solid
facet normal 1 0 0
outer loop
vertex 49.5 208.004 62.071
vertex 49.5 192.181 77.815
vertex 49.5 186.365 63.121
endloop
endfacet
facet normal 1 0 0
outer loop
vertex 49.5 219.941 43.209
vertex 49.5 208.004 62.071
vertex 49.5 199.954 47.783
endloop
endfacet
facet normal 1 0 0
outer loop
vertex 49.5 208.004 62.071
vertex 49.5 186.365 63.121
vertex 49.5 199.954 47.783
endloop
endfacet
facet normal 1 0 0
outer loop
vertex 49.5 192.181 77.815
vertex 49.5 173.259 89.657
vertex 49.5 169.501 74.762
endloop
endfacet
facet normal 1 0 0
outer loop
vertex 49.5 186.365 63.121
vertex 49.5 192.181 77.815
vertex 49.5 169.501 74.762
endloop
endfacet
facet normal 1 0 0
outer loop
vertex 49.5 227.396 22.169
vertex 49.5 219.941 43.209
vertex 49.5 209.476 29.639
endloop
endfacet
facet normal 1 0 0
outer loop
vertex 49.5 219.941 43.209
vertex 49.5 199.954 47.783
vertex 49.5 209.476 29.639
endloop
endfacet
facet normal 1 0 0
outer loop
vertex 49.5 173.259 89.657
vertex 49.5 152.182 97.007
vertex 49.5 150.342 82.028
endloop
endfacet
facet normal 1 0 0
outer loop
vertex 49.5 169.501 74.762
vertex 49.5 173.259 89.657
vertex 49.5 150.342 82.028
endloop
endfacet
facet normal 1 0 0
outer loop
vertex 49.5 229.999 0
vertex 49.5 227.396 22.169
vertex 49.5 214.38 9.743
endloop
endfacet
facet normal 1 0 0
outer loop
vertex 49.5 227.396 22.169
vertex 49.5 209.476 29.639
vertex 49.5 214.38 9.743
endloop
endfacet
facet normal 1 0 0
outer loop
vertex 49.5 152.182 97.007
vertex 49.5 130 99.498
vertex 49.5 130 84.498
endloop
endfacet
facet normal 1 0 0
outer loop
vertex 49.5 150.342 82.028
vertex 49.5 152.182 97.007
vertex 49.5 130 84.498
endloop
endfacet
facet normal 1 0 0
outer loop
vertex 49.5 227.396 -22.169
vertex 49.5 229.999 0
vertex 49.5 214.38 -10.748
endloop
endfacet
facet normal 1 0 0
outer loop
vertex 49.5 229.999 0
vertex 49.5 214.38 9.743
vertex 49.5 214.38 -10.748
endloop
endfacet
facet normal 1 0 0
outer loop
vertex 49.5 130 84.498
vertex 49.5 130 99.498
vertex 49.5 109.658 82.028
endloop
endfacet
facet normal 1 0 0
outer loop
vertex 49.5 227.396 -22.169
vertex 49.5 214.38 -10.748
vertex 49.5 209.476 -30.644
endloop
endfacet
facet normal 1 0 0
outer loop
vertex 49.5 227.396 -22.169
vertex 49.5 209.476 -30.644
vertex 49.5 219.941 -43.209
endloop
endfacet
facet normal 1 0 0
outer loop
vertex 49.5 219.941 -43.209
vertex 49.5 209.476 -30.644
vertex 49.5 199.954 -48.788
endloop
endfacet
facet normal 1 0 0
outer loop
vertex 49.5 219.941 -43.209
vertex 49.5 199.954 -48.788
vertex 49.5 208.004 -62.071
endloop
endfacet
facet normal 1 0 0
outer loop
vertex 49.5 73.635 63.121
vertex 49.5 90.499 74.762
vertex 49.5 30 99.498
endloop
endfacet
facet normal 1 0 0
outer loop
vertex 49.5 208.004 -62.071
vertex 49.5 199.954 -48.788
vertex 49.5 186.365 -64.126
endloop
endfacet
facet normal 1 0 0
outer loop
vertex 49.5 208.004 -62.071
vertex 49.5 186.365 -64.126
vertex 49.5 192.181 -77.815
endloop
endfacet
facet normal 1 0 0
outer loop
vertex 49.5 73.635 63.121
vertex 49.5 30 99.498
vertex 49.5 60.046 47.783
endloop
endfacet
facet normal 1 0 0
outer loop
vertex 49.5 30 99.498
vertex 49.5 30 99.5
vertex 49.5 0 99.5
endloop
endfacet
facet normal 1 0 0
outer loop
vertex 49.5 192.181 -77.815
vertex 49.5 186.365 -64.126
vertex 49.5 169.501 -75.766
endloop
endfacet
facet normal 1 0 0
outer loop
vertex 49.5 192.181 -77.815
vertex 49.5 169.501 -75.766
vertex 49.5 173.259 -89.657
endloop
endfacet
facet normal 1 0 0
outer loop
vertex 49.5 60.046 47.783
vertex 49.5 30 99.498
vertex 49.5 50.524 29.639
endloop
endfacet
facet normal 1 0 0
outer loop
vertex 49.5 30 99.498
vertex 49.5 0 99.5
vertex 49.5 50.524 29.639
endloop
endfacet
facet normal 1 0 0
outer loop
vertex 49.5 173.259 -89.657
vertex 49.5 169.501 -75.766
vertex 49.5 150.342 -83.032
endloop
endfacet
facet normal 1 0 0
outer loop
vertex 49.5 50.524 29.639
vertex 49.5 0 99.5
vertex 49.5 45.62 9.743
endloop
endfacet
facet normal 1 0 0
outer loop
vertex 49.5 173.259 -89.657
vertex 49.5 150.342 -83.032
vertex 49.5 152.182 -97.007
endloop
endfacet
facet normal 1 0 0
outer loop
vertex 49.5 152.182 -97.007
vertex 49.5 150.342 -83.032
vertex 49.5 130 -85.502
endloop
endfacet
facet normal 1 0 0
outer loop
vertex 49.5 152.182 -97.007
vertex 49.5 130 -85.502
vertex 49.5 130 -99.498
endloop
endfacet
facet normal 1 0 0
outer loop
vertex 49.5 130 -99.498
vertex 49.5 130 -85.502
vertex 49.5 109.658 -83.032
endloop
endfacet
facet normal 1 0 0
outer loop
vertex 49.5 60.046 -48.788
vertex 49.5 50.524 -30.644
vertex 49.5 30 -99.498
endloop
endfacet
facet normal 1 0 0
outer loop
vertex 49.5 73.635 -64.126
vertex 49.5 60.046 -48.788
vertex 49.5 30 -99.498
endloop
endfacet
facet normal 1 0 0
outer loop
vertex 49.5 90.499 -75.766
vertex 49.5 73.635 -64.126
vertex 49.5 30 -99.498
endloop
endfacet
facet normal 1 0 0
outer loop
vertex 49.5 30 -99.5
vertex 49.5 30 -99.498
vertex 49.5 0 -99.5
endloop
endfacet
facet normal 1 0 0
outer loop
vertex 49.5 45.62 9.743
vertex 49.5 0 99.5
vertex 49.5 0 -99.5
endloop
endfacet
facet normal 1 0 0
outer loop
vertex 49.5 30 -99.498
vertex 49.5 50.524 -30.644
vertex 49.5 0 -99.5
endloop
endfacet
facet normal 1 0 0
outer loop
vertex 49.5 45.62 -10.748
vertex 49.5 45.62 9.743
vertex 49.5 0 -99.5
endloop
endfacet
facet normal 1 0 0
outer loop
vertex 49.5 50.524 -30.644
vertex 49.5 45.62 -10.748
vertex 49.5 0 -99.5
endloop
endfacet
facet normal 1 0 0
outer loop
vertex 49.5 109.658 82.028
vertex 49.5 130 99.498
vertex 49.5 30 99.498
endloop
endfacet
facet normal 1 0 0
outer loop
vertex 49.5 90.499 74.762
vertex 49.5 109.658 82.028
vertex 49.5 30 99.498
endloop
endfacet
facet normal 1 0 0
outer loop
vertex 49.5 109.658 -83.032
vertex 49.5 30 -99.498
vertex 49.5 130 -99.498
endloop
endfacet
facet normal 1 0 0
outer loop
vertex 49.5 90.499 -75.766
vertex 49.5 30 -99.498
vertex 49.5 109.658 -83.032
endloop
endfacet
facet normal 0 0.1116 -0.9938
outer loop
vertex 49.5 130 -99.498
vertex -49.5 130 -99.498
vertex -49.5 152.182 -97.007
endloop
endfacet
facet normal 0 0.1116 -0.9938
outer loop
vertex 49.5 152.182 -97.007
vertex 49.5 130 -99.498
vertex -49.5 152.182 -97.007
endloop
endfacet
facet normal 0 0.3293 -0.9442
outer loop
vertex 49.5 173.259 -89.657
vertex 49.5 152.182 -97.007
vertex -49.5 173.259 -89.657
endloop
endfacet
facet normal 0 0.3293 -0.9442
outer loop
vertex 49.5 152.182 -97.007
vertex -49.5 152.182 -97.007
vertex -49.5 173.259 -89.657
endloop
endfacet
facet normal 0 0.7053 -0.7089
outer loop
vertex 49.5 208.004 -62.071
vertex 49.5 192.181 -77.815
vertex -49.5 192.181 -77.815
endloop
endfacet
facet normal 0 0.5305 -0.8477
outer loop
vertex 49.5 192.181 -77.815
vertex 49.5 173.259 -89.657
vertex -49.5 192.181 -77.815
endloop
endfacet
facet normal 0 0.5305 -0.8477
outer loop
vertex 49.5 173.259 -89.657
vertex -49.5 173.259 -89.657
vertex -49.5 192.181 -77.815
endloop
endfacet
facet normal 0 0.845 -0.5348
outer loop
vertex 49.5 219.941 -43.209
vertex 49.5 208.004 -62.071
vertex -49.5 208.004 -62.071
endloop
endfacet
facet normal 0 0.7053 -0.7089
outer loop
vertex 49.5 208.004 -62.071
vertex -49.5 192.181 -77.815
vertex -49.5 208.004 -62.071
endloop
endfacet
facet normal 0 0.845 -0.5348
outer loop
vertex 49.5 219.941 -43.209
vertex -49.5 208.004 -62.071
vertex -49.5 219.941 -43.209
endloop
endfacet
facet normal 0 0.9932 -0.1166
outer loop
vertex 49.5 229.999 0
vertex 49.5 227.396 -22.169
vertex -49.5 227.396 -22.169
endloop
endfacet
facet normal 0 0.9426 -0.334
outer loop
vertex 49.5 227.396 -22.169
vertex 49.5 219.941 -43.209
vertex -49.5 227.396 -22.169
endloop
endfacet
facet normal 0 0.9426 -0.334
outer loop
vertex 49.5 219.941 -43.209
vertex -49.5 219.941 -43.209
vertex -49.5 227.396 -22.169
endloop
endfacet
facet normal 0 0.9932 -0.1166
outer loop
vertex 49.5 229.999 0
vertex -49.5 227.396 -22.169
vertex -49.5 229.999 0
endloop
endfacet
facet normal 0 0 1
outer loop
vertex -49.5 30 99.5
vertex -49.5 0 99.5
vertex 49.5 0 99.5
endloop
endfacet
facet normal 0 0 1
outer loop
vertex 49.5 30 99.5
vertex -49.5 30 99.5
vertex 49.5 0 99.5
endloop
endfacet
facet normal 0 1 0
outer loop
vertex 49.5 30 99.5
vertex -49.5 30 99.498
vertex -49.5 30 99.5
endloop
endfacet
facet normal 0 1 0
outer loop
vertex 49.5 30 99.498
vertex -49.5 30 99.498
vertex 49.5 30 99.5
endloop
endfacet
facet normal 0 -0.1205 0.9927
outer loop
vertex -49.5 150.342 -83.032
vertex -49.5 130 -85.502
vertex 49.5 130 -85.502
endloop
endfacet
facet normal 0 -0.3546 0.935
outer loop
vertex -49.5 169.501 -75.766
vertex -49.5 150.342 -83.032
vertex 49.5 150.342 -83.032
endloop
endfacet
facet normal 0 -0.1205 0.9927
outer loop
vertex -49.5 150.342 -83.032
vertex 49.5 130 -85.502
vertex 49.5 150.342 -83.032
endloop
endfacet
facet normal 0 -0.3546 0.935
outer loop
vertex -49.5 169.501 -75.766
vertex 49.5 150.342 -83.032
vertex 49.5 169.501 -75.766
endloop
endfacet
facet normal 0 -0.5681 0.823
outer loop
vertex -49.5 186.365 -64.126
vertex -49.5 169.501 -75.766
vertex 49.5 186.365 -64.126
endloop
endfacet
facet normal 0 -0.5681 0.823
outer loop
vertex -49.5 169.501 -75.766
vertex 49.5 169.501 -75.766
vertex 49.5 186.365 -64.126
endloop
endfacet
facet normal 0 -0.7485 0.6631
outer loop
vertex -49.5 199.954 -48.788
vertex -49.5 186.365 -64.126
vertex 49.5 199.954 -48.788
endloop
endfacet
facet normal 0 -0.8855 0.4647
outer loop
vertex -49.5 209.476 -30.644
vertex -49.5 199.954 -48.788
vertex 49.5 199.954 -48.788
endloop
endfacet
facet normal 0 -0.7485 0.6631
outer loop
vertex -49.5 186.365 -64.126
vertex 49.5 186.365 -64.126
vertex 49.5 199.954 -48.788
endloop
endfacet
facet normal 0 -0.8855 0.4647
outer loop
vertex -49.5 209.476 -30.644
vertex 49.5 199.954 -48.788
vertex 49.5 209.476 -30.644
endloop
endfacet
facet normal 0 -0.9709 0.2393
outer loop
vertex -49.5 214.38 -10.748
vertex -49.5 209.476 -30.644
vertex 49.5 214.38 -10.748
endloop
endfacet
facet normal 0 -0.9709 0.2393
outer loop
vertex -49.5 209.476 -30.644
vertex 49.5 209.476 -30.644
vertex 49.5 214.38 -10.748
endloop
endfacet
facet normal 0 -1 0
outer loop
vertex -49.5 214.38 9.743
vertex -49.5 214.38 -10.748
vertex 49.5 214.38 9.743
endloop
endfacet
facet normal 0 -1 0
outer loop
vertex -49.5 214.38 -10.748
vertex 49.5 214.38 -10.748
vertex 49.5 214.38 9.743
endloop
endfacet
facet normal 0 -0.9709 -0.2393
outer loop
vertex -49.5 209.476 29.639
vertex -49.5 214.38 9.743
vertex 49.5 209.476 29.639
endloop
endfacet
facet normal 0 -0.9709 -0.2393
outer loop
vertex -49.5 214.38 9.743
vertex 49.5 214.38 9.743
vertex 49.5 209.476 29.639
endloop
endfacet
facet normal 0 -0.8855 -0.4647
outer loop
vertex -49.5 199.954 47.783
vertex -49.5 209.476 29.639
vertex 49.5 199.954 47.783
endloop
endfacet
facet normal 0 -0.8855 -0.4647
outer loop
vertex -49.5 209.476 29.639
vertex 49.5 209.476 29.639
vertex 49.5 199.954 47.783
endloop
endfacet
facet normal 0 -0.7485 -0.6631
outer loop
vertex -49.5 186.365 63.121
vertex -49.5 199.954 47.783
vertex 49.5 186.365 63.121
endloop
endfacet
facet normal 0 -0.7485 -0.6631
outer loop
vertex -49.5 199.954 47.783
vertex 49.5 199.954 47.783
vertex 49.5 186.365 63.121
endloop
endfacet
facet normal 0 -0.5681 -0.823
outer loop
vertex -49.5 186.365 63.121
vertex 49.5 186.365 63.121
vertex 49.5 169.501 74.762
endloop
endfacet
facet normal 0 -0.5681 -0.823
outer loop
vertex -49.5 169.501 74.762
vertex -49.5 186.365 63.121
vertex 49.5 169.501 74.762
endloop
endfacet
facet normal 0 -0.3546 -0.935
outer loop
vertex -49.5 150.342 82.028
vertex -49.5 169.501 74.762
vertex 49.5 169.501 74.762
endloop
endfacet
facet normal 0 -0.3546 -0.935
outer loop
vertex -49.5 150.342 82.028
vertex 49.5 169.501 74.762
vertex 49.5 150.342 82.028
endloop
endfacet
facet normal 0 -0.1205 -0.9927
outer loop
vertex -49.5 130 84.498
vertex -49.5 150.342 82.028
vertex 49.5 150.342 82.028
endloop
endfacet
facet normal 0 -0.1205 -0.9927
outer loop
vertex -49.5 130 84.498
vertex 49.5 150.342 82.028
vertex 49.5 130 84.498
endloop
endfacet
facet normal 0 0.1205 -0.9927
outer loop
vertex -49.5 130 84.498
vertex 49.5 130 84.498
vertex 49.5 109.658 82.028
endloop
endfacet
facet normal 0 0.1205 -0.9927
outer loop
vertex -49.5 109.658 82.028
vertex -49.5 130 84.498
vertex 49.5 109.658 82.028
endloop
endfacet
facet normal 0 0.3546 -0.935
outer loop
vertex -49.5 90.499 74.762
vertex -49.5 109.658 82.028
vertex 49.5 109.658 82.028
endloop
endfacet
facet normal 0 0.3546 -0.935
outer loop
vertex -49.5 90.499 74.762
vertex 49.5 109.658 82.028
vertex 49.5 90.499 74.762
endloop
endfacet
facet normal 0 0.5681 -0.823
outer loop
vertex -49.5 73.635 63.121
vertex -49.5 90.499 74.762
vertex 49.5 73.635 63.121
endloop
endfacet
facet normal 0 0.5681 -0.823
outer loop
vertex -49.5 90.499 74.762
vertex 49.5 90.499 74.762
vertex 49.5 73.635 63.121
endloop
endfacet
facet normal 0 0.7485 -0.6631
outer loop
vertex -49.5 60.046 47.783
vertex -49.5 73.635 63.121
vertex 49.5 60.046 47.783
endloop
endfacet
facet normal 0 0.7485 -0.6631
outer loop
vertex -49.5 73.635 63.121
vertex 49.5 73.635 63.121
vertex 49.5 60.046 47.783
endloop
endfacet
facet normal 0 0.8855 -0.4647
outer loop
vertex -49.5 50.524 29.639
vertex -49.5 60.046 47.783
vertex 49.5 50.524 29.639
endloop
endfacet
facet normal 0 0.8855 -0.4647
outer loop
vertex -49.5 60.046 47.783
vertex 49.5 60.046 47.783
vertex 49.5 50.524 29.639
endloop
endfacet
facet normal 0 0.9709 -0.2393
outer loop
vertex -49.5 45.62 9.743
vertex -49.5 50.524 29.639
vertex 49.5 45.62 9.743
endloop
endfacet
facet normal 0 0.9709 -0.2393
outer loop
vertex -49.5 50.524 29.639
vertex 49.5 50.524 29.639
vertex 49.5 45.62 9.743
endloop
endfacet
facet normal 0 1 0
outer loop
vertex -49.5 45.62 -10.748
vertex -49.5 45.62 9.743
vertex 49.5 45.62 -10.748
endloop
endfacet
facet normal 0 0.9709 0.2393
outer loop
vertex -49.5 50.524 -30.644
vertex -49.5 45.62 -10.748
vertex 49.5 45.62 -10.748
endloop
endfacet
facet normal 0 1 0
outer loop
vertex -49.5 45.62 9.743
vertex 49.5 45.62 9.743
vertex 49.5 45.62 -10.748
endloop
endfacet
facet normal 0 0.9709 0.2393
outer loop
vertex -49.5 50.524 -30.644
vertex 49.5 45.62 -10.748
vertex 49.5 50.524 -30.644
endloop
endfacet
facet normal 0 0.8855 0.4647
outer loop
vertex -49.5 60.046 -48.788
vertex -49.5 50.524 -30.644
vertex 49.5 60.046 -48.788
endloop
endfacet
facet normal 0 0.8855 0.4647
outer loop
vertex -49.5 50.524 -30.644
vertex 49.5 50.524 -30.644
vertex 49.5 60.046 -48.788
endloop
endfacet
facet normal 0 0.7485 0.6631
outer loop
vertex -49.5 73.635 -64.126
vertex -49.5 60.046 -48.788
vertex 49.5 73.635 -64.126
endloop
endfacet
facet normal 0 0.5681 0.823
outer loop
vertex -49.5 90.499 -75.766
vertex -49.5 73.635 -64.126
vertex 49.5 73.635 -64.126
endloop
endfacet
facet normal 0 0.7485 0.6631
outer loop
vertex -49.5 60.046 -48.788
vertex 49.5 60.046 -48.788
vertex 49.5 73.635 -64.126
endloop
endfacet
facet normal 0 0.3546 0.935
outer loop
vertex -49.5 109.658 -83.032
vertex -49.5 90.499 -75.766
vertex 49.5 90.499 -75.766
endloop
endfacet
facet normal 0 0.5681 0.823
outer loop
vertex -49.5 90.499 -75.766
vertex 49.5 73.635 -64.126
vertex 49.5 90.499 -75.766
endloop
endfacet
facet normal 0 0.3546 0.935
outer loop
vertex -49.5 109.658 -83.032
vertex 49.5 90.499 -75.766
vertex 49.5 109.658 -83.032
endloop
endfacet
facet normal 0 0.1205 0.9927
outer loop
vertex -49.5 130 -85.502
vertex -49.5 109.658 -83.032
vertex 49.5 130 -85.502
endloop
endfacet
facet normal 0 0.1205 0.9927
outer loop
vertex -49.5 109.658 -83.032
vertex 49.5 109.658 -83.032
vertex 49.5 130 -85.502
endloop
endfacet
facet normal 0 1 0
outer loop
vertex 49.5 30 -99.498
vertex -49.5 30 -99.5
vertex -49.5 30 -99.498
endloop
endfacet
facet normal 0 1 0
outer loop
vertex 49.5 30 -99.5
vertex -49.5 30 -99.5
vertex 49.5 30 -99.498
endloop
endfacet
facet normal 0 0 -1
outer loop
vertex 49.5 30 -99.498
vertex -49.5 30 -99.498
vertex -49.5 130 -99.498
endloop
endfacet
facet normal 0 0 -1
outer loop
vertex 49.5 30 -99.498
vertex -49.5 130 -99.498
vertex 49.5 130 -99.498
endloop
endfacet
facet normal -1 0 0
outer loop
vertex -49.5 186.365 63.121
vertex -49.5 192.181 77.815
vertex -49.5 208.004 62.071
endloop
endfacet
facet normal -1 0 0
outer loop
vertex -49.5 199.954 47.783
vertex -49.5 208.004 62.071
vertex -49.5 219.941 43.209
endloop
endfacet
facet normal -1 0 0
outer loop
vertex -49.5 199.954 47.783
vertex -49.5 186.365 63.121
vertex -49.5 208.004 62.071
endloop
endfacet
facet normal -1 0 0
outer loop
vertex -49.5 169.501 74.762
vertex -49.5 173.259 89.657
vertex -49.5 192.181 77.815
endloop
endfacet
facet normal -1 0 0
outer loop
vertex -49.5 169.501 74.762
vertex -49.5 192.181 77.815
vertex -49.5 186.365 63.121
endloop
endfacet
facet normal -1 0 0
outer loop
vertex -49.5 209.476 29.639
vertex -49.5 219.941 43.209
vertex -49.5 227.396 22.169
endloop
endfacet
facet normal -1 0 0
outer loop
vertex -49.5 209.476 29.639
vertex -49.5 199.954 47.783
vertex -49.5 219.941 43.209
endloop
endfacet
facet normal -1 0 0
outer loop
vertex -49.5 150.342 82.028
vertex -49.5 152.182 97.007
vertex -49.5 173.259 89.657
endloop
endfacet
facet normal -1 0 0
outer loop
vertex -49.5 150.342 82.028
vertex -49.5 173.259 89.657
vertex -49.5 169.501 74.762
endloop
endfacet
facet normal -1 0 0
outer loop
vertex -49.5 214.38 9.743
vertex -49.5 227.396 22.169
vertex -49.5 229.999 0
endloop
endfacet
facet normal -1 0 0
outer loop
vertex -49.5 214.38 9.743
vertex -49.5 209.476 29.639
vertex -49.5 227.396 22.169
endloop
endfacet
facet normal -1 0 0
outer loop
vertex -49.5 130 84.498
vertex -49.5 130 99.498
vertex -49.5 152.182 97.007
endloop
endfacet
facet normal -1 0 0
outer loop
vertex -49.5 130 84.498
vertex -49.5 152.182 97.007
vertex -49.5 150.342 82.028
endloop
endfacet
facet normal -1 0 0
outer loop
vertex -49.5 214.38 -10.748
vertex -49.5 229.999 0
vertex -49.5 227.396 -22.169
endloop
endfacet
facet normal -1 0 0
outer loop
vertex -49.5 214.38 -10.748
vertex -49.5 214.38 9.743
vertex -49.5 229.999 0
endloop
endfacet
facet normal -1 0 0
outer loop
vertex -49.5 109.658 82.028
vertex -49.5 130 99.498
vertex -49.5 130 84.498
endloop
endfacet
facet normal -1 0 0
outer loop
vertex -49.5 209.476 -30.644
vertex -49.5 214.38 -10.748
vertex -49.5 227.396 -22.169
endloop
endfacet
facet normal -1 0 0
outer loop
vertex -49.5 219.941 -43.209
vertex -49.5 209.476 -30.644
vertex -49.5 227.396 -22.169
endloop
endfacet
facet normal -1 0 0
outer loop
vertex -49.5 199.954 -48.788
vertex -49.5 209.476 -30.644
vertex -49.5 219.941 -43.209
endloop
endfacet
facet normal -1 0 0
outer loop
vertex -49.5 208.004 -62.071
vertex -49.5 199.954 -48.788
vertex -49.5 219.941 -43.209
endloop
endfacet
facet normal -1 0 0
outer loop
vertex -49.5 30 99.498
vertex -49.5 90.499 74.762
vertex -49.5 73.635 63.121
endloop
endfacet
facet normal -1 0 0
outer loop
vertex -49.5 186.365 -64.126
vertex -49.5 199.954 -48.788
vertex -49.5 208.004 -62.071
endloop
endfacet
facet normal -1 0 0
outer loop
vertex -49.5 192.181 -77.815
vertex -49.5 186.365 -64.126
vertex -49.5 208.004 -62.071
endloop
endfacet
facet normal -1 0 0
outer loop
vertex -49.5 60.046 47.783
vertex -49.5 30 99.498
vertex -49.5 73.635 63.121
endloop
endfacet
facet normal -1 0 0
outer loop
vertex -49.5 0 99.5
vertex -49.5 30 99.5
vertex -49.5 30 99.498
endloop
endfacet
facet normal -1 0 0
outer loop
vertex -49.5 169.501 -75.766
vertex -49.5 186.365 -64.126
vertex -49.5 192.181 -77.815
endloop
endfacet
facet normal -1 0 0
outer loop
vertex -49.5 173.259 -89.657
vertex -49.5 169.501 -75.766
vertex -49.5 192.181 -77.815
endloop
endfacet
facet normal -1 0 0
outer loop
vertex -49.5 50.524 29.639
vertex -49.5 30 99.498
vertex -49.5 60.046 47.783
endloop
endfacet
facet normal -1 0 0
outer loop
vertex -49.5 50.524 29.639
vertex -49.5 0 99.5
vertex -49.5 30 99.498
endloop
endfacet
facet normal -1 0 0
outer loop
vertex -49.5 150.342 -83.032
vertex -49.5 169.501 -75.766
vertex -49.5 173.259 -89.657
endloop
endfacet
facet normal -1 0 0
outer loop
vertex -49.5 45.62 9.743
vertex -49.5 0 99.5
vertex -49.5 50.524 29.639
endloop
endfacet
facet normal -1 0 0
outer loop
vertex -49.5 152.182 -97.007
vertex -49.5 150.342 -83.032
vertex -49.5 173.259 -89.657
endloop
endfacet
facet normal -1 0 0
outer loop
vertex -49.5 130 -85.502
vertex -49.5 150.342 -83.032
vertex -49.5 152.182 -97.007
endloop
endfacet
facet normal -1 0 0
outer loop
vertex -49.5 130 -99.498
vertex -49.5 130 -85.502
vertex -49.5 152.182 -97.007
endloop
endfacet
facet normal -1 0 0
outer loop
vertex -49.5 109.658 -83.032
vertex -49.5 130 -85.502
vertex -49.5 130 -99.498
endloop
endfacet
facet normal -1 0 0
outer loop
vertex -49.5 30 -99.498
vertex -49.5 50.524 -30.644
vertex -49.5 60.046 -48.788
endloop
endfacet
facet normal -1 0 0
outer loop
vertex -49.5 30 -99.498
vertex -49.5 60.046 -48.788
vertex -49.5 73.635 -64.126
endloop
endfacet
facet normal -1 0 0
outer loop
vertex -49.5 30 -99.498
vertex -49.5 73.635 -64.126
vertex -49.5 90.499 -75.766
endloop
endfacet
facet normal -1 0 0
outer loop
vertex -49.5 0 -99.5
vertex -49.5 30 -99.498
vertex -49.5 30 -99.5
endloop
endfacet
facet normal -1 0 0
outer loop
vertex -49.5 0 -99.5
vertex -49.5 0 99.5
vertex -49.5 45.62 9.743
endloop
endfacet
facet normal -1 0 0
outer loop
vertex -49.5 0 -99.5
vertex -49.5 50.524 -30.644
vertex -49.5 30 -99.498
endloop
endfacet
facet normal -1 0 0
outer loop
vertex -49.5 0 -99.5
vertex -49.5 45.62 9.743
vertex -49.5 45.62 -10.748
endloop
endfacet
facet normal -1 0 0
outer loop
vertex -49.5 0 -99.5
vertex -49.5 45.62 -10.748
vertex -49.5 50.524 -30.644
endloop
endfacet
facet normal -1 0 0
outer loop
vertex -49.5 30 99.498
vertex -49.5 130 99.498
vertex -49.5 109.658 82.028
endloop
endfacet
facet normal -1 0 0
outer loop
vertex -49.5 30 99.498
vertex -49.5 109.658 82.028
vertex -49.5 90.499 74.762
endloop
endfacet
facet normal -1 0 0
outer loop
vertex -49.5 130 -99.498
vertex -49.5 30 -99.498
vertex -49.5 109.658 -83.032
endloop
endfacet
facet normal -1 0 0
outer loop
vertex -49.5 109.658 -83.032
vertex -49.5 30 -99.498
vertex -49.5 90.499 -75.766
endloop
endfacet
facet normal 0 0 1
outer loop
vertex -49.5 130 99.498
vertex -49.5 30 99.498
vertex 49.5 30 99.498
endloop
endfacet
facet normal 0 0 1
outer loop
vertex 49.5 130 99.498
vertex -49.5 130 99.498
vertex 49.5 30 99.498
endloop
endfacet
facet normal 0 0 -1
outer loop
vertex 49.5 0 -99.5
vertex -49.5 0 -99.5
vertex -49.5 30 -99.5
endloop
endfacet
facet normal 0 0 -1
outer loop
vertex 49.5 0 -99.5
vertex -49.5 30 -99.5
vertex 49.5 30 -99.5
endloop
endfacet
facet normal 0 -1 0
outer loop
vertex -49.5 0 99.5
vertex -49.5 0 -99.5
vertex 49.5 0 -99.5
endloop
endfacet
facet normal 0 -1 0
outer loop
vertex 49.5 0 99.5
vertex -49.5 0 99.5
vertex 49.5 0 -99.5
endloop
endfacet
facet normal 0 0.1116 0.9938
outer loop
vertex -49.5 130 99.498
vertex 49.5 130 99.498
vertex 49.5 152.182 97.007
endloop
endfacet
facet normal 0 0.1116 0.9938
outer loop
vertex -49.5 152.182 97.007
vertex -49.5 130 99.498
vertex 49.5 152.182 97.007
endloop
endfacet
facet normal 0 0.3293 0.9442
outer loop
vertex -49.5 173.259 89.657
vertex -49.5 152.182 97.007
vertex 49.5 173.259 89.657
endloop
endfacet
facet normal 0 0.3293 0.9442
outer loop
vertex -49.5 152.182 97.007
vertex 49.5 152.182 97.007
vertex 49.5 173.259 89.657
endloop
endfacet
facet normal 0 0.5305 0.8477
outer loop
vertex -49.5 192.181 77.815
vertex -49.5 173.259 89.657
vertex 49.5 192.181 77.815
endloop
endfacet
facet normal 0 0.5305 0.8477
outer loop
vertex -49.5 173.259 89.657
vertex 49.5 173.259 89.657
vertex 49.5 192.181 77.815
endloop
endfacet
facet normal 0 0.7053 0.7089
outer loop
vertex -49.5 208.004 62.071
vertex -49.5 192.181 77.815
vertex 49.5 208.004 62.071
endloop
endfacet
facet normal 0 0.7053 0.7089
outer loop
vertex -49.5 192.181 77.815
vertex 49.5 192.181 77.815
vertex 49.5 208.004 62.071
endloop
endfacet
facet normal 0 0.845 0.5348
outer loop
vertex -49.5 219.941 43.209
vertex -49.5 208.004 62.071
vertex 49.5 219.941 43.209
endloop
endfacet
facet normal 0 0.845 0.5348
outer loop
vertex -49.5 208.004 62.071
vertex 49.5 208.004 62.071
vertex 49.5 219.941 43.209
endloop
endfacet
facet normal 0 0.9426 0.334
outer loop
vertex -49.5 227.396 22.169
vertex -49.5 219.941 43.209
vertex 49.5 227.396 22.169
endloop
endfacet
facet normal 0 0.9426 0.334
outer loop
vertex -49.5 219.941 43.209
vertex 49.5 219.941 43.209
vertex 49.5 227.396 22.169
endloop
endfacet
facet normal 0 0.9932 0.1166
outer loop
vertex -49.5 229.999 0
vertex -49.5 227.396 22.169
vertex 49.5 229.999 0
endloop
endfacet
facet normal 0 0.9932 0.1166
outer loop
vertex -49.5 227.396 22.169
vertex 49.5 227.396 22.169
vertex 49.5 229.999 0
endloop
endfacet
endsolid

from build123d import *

# Parameters (mm, degrees)
SKETCH1_W           = 99
SKETCH1_H           = 199
BOSS_EXTRUDE1_DEPTH = 30
SKETCH2_W           = 99
SKETCH2_H           = 198.99569364
BOSS_EXTRUDE2_DEPTH = 200
FILLET1_R           = 100
SKETCH3_R           = 85
CUT_EXTRUDE1_DEPTH  = 99


with BuildPart() as part:
    # Sketch1 → Boss-Extrude1 (new body)
    with BuildSketch(Plane(origin=(0, 0, 0), x_dir=(1, 0, 0), z_dir=(0, 1, 0))):
        Rectangle(SKETCH1_W, SKETCH1_H)
    extrude(amount=BOSS_EXTRUDE1_DEPTH)

    # Sketch2 → Boss-Extrude2 (add)
    with BuildSketch(Plane(origin=(0, 30, 0), x_dir=(1, 0, 0), z_dir=(0, 1, 0))):
        Rectangle(SKETCH2_W, SKETCH2_H)
    extrude(amount=BOSS_EXTRUDE2_DEPTH)

    # Fillet1
    # the kernel refuses this fillet: 100 mm, written as the material it takes off along each edge
    with BuildSketch(Plane(origin=(-299.5, 230, -99.49784682), x_dir=(0, -1, 0), z_dir=(1, 0, 0)), Plane(origin=(299.5, 230, 99.49784682), x_dir=(0, -1, 0), z_dir=(-1, 0, 0))) as fillet1_piece_1:
        with BuildLine():
            CenterArc((FILLET1_R, -FILLET1_R), FILLET1_R, 90, 90)
            Line((0, -FILLET1_R), (0, 0))
            Line((0, 0), (FILLET1_R, 0))
        make_face()
    extrude(amount=599, mode=Mode.SUBTRACT)

    # Sketch3 → Cut-Extrude1 (cut)
    with BuildSketch(Plane(origin=(49.5, 0, 0), x_dir=(0, 0, -1), z_dir=(1, 0, 0))):
        with Locations((0.50215318, 130)):
            Circle(SKETCH3_R)
    extrude(amount=-CUT_EXTRUDE1_DEPTH, mode=Mode.SUBTRACT)


solid = part.part
